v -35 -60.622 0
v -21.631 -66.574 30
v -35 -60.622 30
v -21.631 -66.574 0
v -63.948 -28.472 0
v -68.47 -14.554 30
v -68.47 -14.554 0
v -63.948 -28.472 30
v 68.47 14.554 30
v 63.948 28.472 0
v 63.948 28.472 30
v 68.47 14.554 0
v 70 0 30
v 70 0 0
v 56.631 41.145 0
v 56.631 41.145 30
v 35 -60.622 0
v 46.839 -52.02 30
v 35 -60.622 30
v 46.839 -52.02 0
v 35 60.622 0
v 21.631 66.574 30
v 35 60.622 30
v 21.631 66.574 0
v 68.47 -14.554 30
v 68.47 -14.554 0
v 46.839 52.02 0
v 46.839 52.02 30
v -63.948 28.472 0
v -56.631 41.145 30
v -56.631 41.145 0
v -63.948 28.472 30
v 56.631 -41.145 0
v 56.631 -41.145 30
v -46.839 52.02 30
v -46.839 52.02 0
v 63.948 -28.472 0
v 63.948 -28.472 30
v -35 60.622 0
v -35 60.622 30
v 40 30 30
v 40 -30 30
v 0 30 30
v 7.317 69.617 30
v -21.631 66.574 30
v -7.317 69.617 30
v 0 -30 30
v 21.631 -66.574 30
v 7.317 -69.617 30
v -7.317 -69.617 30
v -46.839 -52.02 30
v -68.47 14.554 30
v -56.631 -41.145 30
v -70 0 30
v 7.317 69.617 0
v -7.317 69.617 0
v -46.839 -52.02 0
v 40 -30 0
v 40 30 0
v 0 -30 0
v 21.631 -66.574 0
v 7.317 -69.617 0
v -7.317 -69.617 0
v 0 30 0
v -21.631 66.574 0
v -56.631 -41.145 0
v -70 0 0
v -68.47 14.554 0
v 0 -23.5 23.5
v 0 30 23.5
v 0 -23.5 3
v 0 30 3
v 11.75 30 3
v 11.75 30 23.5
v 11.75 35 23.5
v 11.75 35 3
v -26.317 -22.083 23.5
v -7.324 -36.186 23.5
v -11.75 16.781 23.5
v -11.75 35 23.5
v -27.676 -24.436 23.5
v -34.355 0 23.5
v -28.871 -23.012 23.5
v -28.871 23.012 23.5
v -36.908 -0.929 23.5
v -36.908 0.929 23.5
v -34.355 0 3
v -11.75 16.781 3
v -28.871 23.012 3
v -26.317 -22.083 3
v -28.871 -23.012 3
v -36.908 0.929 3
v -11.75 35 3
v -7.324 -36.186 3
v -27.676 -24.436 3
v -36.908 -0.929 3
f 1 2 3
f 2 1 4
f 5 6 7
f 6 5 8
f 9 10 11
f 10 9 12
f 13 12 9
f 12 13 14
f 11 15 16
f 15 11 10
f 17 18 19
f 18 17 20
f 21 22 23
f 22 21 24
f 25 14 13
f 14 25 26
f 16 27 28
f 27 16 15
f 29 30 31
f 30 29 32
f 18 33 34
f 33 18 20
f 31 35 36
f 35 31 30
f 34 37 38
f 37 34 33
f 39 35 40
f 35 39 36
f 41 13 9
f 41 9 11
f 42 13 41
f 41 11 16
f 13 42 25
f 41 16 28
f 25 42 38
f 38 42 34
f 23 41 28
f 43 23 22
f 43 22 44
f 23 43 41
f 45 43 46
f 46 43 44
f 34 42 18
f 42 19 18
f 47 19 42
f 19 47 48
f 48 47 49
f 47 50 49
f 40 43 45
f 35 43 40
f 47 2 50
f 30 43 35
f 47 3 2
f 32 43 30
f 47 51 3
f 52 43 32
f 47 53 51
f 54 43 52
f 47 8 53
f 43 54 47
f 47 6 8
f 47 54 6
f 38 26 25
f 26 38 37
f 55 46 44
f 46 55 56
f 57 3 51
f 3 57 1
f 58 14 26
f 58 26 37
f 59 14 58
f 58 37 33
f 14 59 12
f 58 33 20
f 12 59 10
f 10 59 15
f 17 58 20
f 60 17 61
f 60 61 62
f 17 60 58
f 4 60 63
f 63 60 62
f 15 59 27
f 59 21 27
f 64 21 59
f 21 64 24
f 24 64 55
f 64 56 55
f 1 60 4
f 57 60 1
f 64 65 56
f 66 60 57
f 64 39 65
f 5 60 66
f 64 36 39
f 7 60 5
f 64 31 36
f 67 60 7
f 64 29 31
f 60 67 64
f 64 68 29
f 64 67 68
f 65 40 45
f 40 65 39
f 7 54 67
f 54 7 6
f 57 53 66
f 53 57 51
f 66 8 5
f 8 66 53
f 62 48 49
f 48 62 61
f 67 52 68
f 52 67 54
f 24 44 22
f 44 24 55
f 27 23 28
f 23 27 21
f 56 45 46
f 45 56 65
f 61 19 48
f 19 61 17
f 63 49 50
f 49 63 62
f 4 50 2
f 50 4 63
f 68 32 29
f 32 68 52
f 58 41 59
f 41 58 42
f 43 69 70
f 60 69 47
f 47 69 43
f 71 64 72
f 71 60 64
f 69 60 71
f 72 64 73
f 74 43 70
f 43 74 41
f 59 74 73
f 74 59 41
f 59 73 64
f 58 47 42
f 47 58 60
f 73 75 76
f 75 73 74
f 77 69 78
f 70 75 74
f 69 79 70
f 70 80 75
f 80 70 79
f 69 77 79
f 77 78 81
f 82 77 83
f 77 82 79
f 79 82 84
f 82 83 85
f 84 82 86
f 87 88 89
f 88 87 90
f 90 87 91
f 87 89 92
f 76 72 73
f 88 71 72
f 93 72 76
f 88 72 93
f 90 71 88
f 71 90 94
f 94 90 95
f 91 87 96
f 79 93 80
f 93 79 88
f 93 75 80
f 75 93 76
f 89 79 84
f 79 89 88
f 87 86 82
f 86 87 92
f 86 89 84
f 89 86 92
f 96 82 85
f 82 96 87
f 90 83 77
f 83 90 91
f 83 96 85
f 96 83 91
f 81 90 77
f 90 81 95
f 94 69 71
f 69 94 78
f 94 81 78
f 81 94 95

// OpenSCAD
difference(){
	cylinder(h = 30, r=70);
	translate([0,-30,0])cube(size = [40,60,30]);
	rotate([0,0,0])translate([-11.75,0,3])cube(size = [23.5,35,20.5]);
	rotate([0,0,70])translate([-11.75,0,3])cube(size = [23.5,35,20.5]);
	rotate([0,0,110])translate([-11.75,0,3])cube(size = [23.5,35,20.5]);
	rotate([0,0,150])translate([-11.75,0,3])cube(size = [23.5,35,20.5]);
}
